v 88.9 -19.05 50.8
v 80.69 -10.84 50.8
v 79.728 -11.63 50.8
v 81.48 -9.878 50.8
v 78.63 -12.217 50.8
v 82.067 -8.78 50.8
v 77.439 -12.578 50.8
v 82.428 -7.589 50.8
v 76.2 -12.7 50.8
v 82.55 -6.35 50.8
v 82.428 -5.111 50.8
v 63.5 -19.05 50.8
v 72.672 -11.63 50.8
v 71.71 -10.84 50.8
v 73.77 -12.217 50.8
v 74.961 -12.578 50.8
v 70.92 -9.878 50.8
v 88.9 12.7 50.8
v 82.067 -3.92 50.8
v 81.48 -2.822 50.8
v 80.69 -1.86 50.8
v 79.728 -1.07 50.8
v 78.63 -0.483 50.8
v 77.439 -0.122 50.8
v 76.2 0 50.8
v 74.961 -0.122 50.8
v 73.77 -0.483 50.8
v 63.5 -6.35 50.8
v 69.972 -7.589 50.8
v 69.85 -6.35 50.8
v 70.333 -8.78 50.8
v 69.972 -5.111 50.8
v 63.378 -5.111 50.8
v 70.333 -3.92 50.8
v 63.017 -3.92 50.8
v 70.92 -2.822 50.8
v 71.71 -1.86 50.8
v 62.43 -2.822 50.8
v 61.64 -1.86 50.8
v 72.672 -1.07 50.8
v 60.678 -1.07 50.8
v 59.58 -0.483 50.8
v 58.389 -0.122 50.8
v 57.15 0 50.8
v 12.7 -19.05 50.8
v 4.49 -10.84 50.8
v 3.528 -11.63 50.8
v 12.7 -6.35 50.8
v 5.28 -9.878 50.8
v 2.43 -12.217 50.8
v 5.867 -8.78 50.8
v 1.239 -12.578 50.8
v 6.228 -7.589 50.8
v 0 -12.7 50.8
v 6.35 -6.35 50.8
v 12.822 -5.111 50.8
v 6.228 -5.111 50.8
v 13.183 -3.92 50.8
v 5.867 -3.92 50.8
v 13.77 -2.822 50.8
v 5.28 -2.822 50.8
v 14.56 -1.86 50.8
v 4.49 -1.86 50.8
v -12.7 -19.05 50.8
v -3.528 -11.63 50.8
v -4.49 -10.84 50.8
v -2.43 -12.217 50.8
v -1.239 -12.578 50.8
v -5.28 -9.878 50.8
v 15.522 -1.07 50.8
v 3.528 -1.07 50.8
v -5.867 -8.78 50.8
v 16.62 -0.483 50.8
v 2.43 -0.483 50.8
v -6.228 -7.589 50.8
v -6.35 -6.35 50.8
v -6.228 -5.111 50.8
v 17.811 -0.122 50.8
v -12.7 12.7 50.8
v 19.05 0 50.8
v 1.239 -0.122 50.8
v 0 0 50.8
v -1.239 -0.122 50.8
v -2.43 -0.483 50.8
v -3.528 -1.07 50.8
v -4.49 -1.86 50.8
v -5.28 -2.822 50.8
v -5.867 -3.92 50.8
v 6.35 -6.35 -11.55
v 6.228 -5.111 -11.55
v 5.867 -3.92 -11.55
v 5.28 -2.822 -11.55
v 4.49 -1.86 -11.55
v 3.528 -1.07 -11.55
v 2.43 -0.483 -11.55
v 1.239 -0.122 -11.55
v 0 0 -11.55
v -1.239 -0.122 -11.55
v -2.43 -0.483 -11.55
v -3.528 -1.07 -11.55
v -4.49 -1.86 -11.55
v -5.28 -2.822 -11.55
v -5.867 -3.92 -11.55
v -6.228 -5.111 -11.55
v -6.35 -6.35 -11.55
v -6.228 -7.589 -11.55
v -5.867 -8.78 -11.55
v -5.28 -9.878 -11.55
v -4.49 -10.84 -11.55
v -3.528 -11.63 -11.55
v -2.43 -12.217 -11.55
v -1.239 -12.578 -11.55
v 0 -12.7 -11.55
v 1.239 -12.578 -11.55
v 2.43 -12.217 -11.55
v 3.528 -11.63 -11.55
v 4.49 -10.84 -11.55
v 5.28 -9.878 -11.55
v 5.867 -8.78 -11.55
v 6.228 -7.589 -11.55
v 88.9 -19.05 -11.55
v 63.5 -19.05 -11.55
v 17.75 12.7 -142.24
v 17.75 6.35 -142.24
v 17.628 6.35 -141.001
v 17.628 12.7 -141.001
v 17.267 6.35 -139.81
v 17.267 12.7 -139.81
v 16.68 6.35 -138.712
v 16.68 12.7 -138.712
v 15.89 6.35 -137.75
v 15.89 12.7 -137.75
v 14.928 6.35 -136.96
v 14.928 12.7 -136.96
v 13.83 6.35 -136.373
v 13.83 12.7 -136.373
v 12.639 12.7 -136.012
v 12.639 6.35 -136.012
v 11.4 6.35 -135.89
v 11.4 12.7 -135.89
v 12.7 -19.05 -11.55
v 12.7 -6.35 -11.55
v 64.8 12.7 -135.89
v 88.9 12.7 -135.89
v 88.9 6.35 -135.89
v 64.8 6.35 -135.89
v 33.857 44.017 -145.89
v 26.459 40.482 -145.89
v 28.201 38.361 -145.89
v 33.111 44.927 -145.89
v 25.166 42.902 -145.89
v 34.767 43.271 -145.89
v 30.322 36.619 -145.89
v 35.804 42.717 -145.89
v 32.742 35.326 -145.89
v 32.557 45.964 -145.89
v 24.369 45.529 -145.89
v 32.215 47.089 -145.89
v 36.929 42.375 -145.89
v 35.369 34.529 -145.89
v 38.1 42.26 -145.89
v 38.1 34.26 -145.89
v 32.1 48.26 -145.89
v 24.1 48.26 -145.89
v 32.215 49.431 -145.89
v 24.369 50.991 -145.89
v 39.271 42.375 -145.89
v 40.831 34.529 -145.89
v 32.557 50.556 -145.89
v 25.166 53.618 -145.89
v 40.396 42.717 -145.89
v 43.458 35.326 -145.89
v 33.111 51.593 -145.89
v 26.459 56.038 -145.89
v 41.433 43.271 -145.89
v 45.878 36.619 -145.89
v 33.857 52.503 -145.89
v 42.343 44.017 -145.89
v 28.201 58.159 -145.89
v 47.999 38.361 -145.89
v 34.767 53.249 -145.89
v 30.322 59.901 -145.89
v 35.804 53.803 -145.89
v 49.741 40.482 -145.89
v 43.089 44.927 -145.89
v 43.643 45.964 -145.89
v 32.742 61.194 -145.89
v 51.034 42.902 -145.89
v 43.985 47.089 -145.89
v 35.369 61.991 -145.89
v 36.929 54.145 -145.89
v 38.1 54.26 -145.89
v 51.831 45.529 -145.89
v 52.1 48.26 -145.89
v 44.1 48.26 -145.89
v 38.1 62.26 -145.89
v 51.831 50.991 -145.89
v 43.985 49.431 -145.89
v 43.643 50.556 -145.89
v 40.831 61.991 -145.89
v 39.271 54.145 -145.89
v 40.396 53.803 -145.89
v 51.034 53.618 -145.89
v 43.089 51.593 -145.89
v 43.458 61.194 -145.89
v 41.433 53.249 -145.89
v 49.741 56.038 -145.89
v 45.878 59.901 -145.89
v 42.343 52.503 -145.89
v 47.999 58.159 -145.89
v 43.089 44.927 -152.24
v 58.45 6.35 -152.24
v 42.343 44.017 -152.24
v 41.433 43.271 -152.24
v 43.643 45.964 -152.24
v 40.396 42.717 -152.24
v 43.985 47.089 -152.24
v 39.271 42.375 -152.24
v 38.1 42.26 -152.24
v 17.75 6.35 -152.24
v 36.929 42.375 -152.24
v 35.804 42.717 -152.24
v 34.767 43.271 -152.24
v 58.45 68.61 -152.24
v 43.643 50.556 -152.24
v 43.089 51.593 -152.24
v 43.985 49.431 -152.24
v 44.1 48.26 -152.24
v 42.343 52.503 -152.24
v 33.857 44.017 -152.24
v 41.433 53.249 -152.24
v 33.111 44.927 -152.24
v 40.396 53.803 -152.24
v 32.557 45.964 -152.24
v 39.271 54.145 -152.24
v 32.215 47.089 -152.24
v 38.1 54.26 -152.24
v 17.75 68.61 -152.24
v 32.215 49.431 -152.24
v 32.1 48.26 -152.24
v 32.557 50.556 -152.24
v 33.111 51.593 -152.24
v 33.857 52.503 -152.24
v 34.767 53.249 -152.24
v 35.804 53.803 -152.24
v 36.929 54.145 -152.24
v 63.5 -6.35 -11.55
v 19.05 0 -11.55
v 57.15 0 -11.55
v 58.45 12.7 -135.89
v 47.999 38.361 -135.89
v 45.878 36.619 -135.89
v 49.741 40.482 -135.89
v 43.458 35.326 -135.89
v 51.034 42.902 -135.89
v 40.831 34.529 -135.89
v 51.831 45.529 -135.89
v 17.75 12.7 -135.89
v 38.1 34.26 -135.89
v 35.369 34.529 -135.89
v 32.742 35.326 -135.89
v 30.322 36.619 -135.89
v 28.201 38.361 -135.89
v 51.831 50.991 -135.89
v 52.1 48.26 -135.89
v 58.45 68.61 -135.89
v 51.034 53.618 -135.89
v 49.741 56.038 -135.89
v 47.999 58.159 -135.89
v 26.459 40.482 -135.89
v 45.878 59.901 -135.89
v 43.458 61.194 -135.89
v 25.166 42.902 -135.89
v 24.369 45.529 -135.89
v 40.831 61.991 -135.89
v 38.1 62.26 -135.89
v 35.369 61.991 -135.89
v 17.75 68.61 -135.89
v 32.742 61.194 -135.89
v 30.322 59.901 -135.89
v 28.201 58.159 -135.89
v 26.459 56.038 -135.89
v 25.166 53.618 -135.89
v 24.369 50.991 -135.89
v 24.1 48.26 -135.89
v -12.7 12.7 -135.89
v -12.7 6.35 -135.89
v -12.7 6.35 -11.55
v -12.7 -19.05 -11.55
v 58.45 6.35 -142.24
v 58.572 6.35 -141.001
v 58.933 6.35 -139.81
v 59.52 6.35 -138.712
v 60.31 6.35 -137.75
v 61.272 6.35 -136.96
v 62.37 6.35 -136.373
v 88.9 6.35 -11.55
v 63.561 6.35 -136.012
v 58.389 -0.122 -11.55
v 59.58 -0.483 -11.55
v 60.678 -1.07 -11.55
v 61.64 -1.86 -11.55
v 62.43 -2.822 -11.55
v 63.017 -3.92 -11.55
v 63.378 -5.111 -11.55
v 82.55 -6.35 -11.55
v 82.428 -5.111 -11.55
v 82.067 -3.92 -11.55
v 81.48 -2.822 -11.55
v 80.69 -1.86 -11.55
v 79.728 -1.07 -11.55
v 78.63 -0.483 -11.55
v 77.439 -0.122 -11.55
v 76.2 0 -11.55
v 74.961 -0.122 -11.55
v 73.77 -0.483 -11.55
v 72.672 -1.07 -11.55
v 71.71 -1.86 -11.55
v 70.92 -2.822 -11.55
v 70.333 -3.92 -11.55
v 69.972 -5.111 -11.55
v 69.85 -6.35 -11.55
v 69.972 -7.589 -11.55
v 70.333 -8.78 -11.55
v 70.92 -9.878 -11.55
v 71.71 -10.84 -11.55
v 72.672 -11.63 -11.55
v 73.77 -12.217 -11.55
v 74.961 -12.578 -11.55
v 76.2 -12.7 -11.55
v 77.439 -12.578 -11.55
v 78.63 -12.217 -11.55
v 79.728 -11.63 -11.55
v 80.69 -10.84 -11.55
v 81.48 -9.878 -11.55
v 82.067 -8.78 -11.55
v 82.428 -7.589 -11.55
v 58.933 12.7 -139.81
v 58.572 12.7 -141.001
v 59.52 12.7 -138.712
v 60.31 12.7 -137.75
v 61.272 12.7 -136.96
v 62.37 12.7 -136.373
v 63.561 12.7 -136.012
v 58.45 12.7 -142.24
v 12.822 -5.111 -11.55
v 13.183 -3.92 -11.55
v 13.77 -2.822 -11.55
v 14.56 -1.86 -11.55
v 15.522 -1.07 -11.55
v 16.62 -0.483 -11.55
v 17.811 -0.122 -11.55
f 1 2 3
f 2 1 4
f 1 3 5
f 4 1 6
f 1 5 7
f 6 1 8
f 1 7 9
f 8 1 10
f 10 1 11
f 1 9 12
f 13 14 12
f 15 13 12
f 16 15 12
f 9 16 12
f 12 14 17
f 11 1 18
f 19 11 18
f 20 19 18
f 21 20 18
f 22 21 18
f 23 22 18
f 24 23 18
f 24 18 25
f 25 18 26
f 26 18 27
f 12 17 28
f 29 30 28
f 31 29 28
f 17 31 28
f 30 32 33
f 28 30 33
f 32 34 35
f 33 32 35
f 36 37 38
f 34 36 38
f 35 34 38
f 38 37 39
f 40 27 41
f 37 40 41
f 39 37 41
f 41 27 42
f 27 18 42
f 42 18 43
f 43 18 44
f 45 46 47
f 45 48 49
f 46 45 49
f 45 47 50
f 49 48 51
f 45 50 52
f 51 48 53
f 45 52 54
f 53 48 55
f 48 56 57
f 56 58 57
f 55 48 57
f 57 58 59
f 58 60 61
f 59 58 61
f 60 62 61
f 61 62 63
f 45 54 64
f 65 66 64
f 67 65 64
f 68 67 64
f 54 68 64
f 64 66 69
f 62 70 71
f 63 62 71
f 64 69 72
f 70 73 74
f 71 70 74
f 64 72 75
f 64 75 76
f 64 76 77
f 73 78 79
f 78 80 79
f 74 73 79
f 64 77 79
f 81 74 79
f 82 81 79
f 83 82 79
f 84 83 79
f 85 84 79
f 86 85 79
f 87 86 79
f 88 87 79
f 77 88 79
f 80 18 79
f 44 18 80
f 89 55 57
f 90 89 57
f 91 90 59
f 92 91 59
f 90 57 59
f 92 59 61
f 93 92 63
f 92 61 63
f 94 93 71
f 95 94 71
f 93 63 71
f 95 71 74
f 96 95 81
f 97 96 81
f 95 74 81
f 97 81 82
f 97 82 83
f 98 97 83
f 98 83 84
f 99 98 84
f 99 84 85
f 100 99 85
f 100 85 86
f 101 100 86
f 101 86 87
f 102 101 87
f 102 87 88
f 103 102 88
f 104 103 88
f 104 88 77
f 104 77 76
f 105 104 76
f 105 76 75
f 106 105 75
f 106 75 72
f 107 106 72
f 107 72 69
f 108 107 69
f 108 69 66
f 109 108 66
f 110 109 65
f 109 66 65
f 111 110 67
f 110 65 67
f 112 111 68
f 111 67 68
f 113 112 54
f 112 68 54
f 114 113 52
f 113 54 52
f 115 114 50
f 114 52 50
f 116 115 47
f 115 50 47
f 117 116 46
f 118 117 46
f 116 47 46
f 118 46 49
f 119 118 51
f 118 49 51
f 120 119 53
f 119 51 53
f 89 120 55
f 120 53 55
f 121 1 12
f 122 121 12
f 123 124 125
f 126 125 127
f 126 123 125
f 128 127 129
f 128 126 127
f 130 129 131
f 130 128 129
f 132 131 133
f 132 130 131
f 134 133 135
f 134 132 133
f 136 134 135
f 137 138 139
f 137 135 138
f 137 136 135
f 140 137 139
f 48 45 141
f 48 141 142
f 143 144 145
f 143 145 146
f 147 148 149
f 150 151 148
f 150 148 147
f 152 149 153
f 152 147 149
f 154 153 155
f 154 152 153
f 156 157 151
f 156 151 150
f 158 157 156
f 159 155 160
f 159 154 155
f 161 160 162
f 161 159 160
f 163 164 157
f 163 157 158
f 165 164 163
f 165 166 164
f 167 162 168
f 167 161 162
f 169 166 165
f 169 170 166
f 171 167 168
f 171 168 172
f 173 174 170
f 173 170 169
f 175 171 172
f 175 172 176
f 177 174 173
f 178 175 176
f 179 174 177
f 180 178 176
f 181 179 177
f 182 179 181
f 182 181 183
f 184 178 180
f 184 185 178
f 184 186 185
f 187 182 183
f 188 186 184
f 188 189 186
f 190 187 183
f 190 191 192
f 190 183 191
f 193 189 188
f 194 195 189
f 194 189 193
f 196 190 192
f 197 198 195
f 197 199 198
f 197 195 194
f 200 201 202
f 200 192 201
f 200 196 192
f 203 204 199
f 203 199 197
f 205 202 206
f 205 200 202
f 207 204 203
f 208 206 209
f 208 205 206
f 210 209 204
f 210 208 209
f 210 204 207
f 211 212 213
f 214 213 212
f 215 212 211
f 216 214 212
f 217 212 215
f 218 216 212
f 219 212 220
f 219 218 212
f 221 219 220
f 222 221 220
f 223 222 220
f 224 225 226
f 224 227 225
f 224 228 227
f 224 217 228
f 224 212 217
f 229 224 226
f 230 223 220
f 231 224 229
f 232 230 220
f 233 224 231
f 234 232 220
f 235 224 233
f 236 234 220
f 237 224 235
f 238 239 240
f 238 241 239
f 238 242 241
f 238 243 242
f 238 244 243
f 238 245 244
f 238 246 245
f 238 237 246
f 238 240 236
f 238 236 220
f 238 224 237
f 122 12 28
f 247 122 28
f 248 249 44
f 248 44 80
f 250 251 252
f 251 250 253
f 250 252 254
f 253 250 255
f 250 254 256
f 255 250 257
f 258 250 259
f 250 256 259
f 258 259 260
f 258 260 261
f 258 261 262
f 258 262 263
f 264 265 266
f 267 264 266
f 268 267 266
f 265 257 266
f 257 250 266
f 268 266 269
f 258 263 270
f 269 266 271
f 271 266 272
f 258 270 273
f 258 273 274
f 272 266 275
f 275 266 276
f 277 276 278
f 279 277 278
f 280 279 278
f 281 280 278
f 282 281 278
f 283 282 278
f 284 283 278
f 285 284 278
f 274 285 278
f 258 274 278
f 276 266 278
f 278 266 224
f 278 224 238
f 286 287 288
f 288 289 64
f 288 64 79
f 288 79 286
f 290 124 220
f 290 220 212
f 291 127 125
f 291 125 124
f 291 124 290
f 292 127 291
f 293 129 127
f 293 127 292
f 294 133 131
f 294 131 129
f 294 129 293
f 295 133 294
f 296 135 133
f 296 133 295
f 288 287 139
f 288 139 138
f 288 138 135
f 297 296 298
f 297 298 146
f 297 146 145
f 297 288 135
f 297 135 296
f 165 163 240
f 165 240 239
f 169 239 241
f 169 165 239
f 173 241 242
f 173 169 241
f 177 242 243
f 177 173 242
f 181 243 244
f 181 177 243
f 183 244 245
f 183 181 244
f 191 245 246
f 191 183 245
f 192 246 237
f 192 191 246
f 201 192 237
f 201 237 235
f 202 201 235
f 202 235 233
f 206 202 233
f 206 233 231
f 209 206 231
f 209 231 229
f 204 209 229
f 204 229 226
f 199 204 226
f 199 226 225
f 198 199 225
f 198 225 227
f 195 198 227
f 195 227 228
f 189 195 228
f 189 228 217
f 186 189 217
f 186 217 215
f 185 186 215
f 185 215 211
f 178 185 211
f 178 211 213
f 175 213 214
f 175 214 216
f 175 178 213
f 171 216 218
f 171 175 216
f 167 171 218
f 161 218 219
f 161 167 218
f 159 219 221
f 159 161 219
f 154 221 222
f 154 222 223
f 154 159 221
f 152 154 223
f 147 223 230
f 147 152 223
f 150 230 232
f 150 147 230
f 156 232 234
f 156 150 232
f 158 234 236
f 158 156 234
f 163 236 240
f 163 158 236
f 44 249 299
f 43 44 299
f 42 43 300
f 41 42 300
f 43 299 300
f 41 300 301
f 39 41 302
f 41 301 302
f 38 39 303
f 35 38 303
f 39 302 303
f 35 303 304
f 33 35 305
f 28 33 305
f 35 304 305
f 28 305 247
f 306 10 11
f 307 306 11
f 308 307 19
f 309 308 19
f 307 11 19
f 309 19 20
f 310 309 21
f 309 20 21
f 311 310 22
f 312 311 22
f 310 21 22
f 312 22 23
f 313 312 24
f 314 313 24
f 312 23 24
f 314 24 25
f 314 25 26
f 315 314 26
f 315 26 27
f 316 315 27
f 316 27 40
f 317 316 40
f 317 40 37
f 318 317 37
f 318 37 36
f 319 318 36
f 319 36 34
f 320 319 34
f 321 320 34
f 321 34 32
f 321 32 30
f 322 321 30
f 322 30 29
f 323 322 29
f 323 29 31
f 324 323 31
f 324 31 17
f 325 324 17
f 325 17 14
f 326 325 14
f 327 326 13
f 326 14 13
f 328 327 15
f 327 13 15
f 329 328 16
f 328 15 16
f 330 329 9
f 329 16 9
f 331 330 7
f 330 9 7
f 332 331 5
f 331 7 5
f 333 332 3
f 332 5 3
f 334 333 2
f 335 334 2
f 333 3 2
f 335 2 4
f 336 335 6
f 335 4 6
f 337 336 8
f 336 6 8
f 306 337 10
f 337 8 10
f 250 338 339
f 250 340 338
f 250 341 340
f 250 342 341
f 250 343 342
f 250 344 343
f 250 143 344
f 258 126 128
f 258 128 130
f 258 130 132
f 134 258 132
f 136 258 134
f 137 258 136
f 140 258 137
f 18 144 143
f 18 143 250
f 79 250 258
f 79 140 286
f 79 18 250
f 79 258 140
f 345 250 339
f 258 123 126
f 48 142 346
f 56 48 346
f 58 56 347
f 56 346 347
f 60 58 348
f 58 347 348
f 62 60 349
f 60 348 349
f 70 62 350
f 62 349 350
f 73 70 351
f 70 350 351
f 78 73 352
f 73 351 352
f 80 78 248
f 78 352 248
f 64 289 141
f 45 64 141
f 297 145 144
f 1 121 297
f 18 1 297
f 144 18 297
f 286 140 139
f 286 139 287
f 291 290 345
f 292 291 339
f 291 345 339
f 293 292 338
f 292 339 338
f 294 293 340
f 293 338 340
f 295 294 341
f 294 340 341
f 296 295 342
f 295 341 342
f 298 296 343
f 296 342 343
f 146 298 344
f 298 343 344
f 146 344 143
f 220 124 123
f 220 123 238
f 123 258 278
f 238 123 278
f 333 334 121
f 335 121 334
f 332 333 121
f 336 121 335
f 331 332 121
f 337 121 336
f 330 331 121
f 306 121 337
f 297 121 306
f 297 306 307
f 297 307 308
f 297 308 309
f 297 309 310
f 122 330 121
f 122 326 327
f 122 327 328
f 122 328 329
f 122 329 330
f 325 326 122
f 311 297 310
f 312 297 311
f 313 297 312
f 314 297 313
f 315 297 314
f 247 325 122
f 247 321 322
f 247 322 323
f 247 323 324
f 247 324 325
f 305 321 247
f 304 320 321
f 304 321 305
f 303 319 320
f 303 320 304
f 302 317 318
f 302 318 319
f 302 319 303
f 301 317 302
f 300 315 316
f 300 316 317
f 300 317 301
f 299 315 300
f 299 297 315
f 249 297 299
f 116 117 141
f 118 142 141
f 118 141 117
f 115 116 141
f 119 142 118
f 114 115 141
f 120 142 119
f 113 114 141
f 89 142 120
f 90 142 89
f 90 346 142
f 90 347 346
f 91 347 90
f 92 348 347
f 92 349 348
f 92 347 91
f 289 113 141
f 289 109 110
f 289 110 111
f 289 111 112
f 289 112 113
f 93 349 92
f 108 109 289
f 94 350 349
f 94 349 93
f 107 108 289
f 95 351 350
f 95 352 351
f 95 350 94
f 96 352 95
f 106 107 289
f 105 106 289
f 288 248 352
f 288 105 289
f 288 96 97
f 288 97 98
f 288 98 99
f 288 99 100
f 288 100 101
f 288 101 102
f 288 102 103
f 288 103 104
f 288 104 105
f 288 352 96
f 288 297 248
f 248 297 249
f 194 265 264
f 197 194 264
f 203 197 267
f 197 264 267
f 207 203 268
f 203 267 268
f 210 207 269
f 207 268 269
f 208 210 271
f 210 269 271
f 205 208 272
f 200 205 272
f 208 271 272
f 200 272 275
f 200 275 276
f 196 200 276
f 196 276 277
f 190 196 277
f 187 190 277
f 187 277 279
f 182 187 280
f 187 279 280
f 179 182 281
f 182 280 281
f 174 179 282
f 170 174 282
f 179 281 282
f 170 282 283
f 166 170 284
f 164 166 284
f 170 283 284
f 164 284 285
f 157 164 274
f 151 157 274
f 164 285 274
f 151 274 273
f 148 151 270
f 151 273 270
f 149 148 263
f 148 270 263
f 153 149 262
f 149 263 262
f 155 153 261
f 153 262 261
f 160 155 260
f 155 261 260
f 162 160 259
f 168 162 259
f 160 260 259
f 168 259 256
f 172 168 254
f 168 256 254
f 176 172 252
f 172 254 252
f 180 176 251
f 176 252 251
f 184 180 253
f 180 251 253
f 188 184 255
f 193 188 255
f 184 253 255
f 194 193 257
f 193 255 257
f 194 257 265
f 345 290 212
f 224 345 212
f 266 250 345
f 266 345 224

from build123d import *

# Parameters (mm, degrees)
SKETCH1_W               = 177.8
SKETCH1_H               = 101.6
BOSS_EXTRUDE1_DEPTH     = 12.7
SKETCH2_W               = 25.4
SKETCH2_H               = 19.05
BOSS_EXTRUDE2_DEPTH     = 101.6
SKETCH3_R               = 6.35
CUT_EXTRUDE1_DEPTH      = 101.6
SKETCH4_W               = 25.4
SKETCH4_H               = 19.05
BOSS_EXTRUDE3_DEPTH     = 101.6
SKETCH5_R               = 6.35
CUT_EXTRUDE2_DEPTH      = 101.6
SKETCH6_W               = 76.2
SKETCH6_H               = 31.75
CUT_EXTRUDE3_DEPTH      = 101.6
FILLET1_R               = 6.35
SKETCH8_W               = 101.6
SKETCH8_H               = 12.7
BOSS_EXTRUDE5_DEPTH     = 85.09
SKETCH9_W               = 40.7
SKETCH9_H               = 68.61
SKETCH9_R               = 6
BOSS_EXTRUDE6_DEPTH     = 16.35
SKETCH10_R              = 14
CUT_EXTRUDE4_DEPTH      = 10
FILLET2_R               = 6.35
SKETCH11_W              = 105.926535366
SKETCH11_H              = 109.219193109
CUT_EXTRUDE5_DEPTH      = 6.35
FILLET3_R               = 3.175
SKETCH12_W              = 101.6
SKETCH12_H              = 25.4
CUT_EXTRUDE6_DEPTH      = 3.175
CUT_EXTRUDE6_DEPTH_BACK = 39.25


with BuildPart() as part:
    # Sketch1 → Boss-Extrude1 (new body)
    with BuildSketch(Plane(origin=(0, 0, 0), x_dir=(1, 0, 0), z_dir=(0, 1, 0))):
        Rectangle(SKETCH1_W, SKETCH1_H)
    extrude(amount=BOSS_EXTRUDE1_DEPTH)

    # Sketch2 → Boss-Extrude2 (add)
    with BuildSketch(Plane.XY.offset(50.8)):
        with Locations((0, -9.525)):
            Rectangle(SKETCH2_W, SKETCH2_H)
    extrude(amount=-BOSS_EXTRUDE2_DEPTH)

    # Sketch3 → Cut-Extrude1 (cut)
    with BuildSketch(Plane.XY.offset(50.8)):
        with Locations((0, -6.35)):
            Circle(SKETCH3_R)
    extrude(amount=-CUT_EXTRUDE1_DEPTH, mode=Mode.SUBTRACT)

    # Sketch4 → Boss-Extrude3 (add)
    with BuildSketch(Plane.XY.offset(50.8)):
        with Locations((-76.2, -9.525)):
            Rectangle(SKETCH4_W, SKETCH4_H)
    boss_extrude3 = extrude(amount=-BOSS_EXTRUDE3_DEPTH)

    # Mirror1: Boss-Extrude3 across plane
    add(boss_extrude3.mirror(Plane(origin=(0, 0, 0), x_dir=(0, 0, 1), z_dir=(1, 0, 0))))

    # Sketch5 → Cut-Extrude2 (cut)
    with BuildSketch(Plane.XY.offset(50.8)):
        with Locations((-76.2, -6.35)):
            Circle(SKETCH5_R)
        with Locations((76.2, -6.35)):
            Circle(SKETCH5_R)
    extrude(amount=-CUT_EXTRUDE2_DEPTH, mode=Mode.SUBTRACT)

    # Sketch6 → Cut-Extrude3 (cut)
    with BuildSketch(Plane(origin=(0, 0, -50.8), x_dir=(-1, 0, 0), z_dir=(0, 0, -1))):
        with Locations((50.8, -3.175)):
            Rectangle(SKETCH6_W, SKETCH6_H)
    extrude(amount=-CUT_EXTRUDE3_DEPTH, mode=Mode.SUBTRACT)

    # Fillet1
    fillet1_edges = [part.edges().sort_by_distance(p)[0] for p in [
        (12.7, 0, 0),
        (63.5, 0, 0),
    ]]
    fillet(fillet1_edges, radius=FILLET1_R)

    # Sketch8 → Boss-Extrude5 (add)
    with BuildSketch(Plane(origin=(0, 0, -50.8), x_dir=(-1, 0, 0), z_dir=(0, 0, -1))):
        with Locations((-38.1, 6.35)):
            Rectangle(SKETCH8_W, SKETCH8_H)
    extrude(amount=BOSS_EXTRUDE5_DEPTH)

    # Sketch9 → Boss-Extrude6 (add)
    with BuildSketch(Plane(origin=(0, 0, -135.89), x_dir=(-1, 0, 0), z_dir=(0, 0, -1))):
        with Locations((-38.1, 34.305)):
            Rectangle(SKETCH9_W, SKETCH9_H)
        with Locations((-38.1, 48.26)):
            Circle(SKETCH9_R, mode=Mode.SUBTRACT)
    extrude(amount=BOSS_EXTRUDE6_DEPTH)

    # Sketch10 → Cut-Extrude4 (cut)
    with BuildSketch(Plane.XY.offset(-135.89)):
        with Locations((38.1, 48.26)):
            Circle(SKETCH10_R)
    extrude(amount=-CUT_EXTRUDE4_DEPTH, mode=Mode.SUBTRACT)

    # Fillet2
    fillet2_edges = [part.edges().sort_by_distance(p)[0] for p in [
        (58.45, 6.35, -135.89),
        (17.75, 6.35, -135.89),
    ]]
    fillet(fillet2_edges, radius=FILLET2_R)

    # Sketch11 → Cut-Extrude5 (cut)
    with BuildSketch(Plane.XZ):
        with Locations((35.936732317, -105.409596555)):
            Rectangle(SKETCH11_W, SKETCH11_H)
    extrude(amount=-CUT_EXTRUDE5_DEPTH, mode=Mode.SUBTRACT)

    # Fillet3
    fillet3_edges = [part.edges().sort_by_distance(p)[0] for p in [
        (38.1, 6.35, -50.8),
    ]]
    fillet(fillet3_edges, radius=FILLET3_R)

    # Sketch12 → Cut-Extrude6 (cut, two sides)
    with BuildSketch(Plane(origin=(0, 0, -50.8), x_dir=(-1, 0, 0), z_dir=(0, 0, -1))) as cut_extrude6_sk:
        with Locations((-38.1, -6.35)):
            Rectangle(SKETCH12_W, SKETCH12_H)
    extrude(amount=CUT_EXTRUDE6_DEPTH, mode=Mode.SUBTRACT)
    extrude(cut_extrude6_sk.sketch, amount=-CUT_EXTRUDE6_DEPTH_BACK, mode=Mode.SUBTRACT)


solid = part.part
